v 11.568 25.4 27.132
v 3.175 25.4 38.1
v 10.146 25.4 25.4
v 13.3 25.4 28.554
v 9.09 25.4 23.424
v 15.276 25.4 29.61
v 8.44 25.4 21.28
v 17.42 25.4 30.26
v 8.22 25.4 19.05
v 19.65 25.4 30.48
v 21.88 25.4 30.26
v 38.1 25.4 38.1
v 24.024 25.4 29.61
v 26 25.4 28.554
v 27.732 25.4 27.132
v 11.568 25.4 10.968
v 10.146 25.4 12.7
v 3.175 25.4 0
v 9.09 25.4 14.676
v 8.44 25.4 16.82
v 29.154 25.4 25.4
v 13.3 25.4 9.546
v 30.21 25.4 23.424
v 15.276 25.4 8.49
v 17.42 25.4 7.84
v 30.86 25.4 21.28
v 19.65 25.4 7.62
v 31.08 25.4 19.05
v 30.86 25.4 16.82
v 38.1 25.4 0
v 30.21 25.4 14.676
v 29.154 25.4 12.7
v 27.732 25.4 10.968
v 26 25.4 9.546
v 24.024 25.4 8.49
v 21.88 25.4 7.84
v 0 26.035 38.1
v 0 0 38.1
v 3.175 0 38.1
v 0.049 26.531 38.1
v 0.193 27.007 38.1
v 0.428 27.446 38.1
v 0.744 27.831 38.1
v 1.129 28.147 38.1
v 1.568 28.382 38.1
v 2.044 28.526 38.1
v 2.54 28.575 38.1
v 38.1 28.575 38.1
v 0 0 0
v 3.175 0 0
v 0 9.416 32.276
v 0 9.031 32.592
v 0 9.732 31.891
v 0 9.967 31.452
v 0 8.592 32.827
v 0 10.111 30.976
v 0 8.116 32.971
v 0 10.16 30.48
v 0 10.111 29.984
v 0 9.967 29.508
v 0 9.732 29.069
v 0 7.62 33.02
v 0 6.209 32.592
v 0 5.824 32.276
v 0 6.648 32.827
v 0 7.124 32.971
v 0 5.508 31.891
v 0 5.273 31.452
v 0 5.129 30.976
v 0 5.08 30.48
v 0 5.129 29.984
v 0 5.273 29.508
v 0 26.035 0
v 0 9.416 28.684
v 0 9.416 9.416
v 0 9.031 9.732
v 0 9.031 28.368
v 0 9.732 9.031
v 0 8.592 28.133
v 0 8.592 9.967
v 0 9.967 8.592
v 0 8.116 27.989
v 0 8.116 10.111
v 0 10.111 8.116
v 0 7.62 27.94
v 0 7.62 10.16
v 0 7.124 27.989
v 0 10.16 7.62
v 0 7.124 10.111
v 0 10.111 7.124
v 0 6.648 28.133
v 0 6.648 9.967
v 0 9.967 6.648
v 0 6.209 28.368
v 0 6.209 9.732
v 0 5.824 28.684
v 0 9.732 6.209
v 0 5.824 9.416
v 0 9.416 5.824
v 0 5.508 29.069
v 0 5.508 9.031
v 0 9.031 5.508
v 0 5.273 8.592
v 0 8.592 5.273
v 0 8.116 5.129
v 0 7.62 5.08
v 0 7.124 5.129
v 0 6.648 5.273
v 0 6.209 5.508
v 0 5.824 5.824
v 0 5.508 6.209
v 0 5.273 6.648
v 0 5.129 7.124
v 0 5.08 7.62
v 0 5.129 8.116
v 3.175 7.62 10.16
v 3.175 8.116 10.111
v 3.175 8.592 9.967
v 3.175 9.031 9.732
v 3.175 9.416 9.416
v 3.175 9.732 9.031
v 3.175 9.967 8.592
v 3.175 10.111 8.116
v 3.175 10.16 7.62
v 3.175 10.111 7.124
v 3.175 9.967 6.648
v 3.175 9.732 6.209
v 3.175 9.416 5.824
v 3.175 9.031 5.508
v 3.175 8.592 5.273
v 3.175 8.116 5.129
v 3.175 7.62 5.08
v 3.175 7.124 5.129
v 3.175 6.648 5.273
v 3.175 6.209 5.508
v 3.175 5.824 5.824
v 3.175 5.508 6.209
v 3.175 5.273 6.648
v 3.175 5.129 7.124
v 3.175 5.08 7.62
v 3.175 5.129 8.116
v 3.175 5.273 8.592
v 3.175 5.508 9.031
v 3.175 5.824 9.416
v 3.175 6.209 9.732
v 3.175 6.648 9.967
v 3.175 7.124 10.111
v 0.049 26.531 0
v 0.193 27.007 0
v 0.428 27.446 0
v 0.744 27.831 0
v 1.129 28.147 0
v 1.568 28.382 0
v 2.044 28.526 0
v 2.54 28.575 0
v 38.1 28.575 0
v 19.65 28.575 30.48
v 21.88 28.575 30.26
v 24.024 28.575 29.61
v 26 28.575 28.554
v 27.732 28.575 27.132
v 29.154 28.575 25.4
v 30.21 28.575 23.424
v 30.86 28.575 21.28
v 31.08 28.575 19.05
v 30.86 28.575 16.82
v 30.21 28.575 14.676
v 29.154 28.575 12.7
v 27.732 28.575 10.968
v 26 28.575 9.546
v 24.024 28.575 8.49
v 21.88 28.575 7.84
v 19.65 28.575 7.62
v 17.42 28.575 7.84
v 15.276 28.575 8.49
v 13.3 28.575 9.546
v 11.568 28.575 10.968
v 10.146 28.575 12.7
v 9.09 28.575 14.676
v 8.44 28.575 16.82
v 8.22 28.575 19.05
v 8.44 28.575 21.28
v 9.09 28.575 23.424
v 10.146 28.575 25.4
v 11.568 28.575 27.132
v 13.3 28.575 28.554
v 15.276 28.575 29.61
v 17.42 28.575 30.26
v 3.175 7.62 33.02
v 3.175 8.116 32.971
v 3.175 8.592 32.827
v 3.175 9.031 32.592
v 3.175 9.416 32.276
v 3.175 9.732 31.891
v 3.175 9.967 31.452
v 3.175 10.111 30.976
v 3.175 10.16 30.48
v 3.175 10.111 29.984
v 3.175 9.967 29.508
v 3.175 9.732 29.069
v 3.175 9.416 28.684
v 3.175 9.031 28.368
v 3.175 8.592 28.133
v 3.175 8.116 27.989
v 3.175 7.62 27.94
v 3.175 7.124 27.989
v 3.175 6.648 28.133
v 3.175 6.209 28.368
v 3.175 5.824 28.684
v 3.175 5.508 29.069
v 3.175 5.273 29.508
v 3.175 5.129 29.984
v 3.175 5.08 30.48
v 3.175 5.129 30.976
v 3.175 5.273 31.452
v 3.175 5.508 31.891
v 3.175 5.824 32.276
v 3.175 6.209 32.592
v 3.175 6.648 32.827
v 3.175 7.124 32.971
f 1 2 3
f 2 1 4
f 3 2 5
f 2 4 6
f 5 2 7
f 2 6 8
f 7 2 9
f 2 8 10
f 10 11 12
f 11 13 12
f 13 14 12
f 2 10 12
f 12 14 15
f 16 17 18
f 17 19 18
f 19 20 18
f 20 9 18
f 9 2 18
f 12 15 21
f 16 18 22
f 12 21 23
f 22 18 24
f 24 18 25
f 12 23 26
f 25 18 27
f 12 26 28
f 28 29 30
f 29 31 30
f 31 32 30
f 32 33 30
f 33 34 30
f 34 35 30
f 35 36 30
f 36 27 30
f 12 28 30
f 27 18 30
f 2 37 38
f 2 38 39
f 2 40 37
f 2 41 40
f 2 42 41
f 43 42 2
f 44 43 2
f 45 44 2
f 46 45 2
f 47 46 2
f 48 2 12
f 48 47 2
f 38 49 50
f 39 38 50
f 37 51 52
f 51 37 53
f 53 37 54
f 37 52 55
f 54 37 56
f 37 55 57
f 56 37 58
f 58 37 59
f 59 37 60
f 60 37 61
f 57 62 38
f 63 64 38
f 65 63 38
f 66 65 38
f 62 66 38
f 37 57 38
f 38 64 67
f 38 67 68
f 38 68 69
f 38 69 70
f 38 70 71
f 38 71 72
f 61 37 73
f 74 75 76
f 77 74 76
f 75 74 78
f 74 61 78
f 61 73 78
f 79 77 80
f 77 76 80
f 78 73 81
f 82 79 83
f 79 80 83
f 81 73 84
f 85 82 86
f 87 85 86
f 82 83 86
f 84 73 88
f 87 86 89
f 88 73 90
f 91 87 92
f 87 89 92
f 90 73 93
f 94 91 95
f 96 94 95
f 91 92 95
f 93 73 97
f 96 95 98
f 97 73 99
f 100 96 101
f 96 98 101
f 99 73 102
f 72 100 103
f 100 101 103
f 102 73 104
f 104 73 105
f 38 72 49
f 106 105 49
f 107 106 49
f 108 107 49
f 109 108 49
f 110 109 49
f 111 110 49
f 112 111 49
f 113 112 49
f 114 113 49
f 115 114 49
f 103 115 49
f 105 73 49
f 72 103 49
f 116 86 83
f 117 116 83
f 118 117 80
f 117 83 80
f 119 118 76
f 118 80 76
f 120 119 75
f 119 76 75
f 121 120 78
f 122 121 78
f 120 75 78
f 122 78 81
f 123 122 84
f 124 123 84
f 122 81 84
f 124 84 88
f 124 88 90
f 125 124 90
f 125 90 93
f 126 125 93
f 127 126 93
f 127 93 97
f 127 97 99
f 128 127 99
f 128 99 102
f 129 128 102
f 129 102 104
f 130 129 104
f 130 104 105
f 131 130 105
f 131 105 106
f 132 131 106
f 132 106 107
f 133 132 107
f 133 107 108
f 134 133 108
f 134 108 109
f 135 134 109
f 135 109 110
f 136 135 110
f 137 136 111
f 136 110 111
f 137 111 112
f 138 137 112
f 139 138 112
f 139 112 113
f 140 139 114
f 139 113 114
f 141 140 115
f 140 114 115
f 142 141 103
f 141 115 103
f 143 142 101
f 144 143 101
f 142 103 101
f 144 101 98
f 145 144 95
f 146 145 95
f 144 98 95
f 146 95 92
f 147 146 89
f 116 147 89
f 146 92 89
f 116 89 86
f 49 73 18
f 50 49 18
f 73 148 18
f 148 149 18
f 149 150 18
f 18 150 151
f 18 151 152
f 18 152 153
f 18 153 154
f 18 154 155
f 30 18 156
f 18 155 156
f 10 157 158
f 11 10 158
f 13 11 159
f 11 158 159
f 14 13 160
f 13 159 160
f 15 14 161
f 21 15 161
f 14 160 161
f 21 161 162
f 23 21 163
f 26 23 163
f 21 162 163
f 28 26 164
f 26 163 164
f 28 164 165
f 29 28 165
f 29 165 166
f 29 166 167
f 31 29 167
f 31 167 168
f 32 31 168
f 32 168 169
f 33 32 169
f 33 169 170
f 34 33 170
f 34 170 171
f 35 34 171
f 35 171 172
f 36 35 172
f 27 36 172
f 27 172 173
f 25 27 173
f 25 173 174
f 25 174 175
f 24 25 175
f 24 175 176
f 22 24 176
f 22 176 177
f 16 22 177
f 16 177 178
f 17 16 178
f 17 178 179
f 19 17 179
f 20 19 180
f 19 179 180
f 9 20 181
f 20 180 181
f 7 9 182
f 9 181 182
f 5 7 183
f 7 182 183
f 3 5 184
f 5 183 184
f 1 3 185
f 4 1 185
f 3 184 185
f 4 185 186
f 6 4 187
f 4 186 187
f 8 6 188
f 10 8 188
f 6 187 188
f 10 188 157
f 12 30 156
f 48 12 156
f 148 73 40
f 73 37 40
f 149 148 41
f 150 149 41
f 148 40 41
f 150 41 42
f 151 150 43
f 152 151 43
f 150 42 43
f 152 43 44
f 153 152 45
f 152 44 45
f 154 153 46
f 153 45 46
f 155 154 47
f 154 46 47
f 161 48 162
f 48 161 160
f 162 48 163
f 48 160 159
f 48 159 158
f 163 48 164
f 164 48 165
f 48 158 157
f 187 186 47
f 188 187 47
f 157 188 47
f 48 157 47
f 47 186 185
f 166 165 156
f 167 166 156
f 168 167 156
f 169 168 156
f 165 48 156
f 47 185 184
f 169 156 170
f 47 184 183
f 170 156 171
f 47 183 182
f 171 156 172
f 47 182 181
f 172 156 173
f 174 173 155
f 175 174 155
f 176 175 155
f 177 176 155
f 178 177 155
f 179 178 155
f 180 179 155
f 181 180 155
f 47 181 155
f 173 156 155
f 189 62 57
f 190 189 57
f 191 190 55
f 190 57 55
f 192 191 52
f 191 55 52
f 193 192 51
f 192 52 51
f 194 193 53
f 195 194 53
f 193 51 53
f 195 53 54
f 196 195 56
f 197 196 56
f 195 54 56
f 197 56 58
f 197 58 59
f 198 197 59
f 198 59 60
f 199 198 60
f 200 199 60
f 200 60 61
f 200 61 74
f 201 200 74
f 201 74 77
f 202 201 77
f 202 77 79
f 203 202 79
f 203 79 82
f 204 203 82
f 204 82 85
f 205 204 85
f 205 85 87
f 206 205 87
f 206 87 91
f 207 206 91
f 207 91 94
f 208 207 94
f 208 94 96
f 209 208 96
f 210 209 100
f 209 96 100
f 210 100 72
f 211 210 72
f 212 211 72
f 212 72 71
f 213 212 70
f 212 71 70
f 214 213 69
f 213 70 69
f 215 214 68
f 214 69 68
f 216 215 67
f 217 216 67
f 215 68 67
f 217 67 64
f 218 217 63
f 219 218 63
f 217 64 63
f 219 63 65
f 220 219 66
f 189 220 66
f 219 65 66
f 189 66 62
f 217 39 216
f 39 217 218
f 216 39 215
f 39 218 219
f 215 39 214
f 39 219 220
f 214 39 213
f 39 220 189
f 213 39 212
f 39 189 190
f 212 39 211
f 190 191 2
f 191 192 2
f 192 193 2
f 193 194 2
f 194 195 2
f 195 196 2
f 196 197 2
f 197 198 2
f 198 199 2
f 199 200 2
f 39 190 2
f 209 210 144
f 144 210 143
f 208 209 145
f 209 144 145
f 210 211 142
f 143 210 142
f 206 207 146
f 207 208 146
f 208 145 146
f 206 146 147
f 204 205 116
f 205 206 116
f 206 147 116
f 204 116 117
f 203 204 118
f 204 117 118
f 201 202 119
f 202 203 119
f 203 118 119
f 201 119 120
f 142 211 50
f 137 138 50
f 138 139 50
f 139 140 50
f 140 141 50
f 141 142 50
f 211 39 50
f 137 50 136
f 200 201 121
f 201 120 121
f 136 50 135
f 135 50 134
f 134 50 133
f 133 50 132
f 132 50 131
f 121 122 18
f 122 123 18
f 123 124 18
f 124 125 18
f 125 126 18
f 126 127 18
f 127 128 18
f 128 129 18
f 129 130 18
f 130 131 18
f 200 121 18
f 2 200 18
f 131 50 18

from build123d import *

# Parameters (mm, degrees)
SKETCH1_W           = 3.175
SKETCH1_H           = 25.4
BOSS_EXTRUDE1_DEPTH = 38.1
FILLET1_R           = 2.54
SKETCH2_R           = 11.43
CUT_EXTRUDE1_DEPTH  = 38.1
SKETCH3_R           = 2.54
CUT_EXTRUDE3_DEPTH  = 61.989758362


with BuildPart() as part:
    # Sketch1 → Boss-Extrude1 (new body)
    with BuildSketch(Plane.XY):
        Polygon((0, 28.575), (0, 25.4), (3.175, 25.4), (38.1, 25.4), (38.1, 28.575), align=None)
        with Locations((1.5875, 12.7)):
            Rectangle(SKETCH1_W, SKETCH1_H)
    extrude(amount=BOSS_EXTRUDE1_DEPTH)

    # Fillet1
    fillet1_edges = [part.edges().sort_by_distance(p)[0] for p in [
        (0, 28.575, 19.05),
    ]]
    fillet(fillet1_edges, radius=FILLET1_R)

    # Sketch2 → Cut-Extrude1 (cut)
    with BuildSketch(Plane(origin=(0, 28.575, 0), x_dir=(1, 0, 0), z_dir=(0, 1, 0))):
        with Locations(Location((19.649884534, -19.05, 0), (0, 0, 270))):
            Circle(SKETCH2_R)
    extrude(amount=-CUT_EXTRUDE1_DEPTH, mode=Mode.SUBTRACT)

    # Sketch3 → Cut-Extrude3 (cut, through all)
    with BuildSketch(Plane.ZY):
        with Locations((7.62, 7.62)):
            Circle(SKETCH3_R)
        with Locations((30.48, 7.62)):
            Circle(SKETCH3_R)
    extrude(amount=-CUT_EXTRUDE3_DEPTH, mode=Mode.SUBTRACT)


solid = part.part
